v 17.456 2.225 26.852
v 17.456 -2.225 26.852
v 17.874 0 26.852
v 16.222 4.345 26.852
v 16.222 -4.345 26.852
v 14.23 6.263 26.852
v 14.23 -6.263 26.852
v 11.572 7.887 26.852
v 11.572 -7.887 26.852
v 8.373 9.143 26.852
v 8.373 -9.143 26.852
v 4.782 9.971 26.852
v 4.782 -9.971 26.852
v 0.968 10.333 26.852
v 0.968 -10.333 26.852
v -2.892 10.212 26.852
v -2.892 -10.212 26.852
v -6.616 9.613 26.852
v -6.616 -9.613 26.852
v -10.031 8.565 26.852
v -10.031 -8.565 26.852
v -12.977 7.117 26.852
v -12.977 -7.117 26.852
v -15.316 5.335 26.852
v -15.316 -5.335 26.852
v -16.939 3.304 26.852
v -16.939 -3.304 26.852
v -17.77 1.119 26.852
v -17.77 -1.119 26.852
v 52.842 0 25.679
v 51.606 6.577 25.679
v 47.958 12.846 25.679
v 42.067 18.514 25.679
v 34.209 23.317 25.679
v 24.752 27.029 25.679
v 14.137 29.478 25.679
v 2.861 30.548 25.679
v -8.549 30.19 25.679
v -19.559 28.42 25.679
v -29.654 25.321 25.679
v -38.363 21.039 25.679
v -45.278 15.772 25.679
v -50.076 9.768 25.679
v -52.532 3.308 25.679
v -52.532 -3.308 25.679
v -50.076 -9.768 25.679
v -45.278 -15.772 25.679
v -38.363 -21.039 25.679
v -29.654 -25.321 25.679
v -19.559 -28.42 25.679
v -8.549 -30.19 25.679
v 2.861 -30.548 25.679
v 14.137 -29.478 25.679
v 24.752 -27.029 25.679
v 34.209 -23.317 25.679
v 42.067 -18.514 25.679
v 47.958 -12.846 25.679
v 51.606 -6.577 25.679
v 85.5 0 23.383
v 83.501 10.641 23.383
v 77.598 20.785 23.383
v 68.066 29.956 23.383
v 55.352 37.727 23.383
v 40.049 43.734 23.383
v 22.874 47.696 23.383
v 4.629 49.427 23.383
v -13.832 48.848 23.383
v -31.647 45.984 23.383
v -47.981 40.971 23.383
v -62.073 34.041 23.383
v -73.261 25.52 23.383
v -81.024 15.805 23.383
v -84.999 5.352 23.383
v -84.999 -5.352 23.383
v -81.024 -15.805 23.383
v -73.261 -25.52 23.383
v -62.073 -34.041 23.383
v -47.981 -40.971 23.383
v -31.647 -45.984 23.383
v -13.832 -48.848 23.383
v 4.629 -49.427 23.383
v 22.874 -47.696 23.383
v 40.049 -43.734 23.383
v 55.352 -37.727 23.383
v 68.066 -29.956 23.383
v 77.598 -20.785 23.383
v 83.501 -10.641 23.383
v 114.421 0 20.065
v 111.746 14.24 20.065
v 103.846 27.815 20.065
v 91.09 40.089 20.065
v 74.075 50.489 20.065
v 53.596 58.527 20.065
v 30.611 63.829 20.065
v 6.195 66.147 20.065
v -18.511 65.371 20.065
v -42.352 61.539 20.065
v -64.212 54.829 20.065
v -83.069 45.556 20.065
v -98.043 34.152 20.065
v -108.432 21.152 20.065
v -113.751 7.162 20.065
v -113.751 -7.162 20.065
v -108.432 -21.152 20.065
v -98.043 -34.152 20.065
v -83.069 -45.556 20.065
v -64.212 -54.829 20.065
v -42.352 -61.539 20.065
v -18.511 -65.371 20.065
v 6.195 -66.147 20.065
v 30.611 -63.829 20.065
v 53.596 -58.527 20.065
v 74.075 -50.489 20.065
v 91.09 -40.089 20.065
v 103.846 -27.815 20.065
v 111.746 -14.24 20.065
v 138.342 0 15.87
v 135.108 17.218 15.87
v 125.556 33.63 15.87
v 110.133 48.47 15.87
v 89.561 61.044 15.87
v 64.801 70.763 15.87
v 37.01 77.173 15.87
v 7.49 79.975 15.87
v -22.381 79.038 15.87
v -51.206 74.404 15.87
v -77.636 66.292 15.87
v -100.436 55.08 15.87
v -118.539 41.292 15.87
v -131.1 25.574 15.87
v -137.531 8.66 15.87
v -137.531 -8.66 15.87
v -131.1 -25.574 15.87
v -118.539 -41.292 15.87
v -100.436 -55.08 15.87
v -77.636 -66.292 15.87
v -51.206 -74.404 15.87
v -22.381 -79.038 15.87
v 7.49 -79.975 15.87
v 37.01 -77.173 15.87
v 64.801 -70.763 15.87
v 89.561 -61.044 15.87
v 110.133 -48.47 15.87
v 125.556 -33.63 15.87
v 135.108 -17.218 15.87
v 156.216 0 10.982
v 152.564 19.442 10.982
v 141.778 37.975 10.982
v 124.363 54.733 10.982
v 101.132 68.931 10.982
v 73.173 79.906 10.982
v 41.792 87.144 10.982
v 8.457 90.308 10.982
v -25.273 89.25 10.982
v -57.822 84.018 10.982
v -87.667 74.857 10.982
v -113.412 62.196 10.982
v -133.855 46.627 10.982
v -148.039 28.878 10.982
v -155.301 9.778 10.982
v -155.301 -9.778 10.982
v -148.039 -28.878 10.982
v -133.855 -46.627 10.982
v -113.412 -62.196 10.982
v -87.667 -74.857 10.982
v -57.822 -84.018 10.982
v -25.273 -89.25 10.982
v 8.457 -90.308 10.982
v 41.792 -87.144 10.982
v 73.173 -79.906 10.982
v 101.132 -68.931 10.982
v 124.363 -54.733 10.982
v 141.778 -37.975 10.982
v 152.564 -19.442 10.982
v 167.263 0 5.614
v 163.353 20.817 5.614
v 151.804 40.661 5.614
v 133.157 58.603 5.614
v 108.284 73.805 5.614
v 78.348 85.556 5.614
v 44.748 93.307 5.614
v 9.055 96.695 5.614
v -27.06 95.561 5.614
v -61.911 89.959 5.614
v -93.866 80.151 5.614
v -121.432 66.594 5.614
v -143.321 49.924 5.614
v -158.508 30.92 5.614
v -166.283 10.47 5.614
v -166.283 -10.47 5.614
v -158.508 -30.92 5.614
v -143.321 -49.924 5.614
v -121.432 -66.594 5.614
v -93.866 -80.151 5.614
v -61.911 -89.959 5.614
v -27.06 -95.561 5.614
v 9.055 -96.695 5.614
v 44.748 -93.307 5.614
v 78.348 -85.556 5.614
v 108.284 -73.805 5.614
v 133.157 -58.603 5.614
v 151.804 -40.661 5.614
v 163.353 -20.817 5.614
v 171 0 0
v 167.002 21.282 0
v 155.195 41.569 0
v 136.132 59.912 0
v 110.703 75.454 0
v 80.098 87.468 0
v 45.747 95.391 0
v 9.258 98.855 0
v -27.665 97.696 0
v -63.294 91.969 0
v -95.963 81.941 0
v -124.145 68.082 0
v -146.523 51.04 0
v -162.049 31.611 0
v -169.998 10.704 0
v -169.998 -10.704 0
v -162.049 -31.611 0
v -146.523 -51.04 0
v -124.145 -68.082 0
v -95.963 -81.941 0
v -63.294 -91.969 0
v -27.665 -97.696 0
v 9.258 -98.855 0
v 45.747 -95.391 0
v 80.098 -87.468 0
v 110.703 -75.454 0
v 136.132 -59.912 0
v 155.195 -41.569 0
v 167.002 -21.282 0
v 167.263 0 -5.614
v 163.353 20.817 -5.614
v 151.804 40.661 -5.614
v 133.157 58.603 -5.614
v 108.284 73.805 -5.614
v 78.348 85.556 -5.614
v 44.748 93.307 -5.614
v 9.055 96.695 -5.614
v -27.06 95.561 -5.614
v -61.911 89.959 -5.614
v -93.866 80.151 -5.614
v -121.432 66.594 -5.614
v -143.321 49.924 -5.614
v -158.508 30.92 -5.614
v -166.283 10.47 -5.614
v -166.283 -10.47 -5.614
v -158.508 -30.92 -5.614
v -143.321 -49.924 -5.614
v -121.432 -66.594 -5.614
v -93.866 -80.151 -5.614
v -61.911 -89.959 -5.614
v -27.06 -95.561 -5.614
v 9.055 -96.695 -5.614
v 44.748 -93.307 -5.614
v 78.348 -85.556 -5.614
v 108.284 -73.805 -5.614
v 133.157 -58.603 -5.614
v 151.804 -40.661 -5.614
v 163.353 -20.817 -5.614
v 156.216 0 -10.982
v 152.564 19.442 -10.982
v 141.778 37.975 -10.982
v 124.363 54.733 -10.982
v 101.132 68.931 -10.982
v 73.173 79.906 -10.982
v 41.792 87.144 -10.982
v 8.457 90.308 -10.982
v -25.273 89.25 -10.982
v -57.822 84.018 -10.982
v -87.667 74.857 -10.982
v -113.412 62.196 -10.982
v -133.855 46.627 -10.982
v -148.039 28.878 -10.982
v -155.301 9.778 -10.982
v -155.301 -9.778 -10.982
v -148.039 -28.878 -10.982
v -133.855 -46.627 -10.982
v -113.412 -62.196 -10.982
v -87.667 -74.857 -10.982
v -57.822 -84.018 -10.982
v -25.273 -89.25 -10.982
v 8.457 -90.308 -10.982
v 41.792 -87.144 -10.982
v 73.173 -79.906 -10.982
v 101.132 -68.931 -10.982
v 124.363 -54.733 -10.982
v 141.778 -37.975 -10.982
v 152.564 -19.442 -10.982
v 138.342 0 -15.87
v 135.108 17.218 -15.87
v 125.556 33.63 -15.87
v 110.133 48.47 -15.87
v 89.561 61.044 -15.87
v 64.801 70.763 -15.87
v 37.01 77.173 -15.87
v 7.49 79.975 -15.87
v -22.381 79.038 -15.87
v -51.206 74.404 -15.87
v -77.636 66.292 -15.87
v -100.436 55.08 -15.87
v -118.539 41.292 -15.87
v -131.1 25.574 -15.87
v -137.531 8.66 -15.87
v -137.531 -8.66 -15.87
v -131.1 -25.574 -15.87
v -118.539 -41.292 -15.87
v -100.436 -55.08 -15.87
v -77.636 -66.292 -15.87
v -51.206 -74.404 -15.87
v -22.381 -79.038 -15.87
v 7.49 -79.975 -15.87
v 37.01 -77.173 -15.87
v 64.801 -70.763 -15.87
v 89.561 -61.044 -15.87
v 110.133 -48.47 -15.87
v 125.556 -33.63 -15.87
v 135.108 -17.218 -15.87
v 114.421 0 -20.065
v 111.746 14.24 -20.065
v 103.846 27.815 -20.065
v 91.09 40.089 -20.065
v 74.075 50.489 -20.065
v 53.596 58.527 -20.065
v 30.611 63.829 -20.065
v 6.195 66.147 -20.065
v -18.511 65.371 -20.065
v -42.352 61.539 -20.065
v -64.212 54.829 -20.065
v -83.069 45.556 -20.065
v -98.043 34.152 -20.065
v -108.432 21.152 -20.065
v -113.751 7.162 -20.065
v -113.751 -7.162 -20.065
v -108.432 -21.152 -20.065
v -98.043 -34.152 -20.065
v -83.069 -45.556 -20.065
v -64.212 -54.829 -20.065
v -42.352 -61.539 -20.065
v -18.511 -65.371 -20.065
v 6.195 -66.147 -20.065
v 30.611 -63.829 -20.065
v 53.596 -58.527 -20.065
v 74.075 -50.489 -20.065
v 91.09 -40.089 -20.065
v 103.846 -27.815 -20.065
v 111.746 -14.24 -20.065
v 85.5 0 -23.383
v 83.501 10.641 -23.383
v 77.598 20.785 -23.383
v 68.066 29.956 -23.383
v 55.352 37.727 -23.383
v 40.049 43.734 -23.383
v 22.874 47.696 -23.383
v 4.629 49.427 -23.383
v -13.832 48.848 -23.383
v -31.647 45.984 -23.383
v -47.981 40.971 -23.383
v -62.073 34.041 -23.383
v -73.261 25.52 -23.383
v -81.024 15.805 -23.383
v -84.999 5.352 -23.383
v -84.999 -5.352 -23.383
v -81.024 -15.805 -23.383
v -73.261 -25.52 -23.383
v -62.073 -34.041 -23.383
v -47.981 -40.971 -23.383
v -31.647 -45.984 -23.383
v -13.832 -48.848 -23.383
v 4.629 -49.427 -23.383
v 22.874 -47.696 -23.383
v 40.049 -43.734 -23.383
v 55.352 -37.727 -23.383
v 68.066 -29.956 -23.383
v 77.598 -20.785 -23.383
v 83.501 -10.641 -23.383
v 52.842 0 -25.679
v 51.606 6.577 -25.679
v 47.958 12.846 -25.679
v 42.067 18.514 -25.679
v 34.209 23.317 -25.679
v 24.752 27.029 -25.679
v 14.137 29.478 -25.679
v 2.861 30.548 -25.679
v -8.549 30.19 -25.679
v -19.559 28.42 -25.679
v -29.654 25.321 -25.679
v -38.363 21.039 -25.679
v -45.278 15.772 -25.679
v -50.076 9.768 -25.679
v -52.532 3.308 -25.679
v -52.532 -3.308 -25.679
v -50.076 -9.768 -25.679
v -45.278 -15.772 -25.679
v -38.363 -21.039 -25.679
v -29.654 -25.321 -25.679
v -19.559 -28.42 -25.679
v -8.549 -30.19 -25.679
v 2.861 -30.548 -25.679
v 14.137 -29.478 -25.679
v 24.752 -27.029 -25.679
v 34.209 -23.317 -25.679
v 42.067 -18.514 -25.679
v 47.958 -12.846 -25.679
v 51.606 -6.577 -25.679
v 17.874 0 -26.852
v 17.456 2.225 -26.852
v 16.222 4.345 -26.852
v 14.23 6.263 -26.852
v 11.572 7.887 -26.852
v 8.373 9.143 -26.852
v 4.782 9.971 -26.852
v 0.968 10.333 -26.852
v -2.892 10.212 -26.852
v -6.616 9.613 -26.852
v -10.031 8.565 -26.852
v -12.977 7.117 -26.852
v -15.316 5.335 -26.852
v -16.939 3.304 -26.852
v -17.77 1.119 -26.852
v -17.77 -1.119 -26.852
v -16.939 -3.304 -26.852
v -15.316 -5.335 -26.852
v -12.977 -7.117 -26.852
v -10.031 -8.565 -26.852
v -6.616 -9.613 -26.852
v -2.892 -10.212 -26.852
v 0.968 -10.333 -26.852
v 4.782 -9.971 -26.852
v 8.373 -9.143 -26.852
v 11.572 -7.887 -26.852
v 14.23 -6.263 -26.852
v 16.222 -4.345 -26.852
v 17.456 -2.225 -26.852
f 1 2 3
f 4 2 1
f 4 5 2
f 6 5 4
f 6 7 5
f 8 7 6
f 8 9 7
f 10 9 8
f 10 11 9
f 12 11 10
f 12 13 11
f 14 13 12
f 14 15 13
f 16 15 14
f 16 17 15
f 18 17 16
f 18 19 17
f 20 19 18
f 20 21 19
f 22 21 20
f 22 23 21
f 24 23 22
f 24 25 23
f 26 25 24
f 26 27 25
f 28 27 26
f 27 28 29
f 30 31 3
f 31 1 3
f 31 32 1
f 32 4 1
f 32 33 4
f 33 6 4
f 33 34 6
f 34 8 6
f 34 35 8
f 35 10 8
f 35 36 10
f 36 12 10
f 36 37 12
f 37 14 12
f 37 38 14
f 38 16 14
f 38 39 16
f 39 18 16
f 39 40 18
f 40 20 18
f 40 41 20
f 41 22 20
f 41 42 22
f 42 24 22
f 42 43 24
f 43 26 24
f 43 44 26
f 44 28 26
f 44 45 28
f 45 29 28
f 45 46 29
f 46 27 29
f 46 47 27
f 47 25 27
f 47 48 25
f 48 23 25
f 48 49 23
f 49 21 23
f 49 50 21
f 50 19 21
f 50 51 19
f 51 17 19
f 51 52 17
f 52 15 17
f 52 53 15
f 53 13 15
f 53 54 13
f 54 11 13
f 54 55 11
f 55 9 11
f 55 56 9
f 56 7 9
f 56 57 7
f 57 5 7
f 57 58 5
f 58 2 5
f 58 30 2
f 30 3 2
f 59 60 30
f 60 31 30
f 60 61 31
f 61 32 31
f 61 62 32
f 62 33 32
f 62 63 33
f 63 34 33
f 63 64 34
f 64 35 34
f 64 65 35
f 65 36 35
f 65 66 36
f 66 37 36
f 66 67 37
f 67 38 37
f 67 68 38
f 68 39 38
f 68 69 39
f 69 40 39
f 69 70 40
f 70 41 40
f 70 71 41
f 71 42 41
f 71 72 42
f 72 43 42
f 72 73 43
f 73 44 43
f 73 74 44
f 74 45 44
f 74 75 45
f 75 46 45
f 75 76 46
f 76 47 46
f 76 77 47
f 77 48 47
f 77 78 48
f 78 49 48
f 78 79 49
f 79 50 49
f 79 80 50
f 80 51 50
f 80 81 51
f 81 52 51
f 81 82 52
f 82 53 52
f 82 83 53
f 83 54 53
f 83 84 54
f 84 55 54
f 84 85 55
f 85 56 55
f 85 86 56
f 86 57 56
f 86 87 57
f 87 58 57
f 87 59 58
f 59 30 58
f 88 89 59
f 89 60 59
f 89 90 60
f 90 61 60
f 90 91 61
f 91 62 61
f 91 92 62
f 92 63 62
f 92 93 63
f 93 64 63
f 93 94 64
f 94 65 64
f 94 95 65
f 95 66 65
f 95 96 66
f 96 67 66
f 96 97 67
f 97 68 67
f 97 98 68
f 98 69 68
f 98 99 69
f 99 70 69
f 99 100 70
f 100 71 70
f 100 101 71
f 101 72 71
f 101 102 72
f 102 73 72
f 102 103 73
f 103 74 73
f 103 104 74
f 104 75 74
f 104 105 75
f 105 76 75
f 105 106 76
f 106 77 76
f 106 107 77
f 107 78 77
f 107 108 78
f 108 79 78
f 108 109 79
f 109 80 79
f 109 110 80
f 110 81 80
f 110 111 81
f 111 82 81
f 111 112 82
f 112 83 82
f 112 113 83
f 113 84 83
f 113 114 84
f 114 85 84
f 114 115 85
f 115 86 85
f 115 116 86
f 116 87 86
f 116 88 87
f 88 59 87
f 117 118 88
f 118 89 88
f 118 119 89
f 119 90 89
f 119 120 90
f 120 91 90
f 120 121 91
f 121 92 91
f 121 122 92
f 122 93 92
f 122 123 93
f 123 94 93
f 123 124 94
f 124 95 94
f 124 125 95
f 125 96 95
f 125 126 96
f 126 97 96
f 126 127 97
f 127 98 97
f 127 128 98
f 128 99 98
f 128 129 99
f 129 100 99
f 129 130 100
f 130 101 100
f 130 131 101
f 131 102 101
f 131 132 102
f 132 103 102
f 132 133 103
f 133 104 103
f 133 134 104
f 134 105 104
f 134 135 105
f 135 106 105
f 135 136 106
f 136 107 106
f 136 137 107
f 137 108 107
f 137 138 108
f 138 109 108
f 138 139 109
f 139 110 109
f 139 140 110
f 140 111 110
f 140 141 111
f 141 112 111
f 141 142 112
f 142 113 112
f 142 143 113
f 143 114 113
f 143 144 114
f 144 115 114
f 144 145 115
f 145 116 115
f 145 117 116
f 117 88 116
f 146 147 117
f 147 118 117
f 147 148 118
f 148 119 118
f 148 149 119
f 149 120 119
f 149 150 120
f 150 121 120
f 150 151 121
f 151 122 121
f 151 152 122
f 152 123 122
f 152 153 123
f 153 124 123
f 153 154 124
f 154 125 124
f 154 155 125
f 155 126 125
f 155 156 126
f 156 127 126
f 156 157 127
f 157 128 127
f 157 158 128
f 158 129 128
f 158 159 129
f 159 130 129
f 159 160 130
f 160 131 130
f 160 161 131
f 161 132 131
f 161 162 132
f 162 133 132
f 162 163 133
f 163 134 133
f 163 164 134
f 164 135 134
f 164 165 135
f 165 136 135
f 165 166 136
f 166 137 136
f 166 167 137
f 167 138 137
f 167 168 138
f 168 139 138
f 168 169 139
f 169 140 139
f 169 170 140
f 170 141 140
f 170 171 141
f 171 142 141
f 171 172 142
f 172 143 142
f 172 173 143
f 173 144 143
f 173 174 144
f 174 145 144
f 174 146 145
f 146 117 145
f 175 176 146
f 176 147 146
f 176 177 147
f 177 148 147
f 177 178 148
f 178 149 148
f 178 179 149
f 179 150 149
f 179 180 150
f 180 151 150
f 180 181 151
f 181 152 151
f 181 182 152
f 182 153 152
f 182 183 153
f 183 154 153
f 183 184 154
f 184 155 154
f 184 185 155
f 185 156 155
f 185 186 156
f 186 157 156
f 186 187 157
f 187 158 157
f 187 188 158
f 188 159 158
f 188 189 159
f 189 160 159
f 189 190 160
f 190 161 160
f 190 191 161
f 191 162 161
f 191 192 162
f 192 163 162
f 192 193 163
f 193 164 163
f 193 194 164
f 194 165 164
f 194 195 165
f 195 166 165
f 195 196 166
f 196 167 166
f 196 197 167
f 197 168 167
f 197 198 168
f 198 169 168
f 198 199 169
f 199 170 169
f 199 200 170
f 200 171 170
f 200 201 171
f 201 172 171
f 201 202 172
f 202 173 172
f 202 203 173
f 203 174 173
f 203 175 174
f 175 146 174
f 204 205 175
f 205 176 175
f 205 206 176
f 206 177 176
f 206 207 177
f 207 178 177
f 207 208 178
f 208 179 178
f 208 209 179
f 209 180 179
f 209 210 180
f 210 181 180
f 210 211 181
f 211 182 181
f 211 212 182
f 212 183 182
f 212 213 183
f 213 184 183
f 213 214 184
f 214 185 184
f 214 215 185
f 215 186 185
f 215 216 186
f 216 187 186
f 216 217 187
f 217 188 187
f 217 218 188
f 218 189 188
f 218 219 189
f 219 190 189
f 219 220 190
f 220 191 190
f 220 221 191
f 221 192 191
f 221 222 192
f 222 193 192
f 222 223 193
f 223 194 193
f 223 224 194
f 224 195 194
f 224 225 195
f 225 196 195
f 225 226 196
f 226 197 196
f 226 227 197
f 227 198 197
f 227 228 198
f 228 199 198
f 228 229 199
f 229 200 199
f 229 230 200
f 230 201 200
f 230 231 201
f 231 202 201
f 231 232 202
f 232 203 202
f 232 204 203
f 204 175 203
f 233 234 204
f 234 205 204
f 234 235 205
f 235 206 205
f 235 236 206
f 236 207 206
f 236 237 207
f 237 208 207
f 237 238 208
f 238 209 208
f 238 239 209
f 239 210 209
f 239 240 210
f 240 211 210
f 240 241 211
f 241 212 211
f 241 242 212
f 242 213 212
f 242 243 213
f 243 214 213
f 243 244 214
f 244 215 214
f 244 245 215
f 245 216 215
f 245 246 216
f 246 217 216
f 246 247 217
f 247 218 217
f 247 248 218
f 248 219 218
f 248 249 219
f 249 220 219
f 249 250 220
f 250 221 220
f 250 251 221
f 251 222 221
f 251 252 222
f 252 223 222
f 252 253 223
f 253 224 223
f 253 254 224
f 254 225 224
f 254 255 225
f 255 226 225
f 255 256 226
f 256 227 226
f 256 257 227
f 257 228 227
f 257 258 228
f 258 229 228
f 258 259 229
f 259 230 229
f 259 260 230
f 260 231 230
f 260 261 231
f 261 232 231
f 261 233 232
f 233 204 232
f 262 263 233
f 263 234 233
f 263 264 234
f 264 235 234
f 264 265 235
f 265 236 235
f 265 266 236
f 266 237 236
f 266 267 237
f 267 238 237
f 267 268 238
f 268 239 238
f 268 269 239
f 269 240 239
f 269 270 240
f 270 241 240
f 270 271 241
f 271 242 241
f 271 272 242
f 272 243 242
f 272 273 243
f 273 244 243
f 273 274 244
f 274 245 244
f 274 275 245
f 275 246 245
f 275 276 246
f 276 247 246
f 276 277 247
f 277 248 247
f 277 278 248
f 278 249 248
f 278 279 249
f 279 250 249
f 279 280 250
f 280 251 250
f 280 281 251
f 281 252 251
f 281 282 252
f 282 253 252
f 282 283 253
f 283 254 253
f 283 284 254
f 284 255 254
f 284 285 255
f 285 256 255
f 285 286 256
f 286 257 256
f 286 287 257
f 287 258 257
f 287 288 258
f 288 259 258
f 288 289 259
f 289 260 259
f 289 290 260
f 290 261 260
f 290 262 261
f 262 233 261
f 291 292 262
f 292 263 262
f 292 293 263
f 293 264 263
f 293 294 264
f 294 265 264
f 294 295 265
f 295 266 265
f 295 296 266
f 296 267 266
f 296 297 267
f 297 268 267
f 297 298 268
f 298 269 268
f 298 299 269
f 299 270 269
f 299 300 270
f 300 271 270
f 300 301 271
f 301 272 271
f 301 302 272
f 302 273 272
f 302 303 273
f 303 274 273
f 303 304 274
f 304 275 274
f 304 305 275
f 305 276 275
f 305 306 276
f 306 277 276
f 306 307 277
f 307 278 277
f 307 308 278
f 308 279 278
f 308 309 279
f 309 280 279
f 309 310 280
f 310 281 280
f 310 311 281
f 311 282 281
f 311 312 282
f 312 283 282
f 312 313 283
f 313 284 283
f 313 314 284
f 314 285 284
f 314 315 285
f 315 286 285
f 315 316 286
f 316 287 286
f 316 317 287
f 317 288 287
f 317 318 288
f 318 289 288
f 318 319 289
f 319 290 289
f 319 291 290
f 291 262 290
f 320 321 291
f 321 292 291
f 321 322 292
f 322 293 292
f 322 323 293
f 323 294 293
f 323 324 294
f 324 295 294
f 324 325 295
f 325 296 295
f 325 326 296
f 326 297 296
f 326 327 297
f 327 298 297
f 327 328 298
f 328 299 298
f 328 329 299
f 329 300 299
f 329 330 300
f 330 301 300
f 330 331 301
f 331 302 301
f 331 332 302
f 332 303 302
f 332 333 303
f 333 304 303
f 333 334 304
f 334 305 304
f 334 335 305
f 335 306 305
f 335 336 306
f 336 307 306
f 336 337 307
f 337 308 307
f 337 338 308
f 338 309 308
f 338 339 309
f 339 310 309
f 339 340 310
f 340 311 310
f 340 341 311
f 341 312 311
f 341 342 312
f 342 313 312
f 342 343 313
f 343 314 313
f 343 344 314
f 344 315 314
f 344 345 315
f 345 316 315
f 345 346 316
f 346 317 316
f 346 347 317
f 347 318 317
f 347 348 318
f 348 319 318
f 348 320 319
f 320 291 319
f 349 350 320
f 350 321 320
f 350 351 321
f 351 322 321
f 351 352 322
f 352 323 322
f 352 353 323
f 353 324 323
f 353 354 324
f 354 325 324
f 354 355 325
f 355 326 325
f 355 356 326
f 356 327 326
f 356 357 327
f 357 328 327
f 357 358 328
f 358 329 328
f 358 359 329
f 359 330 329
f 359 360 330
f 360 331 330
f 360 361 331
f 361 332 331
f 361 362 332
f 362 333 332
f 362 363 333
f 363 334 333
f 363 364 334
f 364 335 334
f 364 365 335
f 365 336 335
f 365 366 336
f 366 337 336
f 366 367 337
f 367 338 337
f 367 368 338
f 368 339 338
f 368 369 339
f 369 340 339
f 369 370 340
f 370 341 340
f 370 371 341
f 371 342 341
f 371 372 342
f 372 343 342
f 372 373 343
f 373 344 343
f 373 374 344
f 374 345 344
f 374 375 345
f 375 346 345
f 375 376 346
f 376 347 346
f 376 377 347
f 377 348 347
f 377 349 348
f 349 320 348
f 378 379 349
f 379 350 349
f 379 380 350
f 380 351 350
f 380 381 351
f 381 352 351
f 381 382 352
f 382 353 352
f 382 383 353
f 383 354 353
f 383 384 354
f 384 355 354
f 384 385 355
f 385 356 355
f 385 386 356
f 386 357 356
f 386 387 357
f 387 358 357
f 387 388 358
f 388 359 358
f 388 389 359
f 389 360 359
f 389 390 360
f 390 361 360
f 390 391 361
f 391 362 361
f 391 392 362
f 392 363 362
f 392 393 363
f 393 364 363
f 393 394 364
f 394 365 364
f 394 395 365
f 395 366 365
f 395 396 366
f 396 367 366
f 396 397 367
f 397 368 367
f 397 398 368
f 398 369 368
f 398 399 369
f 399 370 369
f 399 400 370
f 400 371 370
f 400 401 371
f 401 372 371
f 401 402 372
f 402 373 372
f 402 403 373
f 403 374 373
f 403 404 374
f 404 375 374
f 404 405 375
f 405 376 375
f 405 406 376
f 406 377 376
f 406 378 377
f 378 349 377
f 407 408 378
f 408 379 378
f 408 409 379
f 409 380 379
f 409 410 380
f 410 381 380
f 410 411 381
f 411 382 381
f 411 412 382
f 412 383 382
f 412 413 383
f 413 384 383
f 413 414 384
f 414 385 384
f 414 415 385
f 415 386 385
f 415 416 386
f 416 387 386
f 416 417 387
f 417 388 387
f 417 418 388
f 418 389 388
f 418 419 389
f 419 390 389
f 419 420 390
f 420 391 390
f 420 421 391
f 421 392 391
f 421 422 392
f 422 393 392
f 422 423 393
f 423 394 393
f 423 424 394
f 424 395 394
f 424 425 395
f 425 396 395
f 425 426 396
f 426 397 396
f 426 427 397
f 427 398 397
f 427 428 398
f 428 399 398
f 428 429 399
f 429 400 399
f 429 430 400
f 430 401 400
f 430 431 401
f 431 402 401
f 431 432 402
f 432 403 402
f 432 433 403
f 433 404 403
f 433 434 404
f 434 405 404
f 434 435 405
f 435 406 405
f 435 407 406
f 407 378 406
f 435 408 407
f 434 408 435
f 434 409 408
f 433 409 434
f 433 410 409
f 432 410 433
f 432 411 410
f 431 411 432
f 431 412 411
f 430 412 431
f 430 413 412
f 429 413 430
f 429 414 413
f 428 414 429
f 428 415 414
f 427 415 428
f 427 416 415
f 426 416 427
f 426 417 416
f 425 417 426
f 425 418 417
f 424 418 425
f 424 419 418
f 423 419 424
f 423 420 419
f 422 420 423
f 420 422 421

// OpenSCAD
// Generated by SolidPython 1.0.1 on 2020-07-29 00:46:54


scale(v = [19, 11, 3]) {
	sphere(r = 9);
}
/***********************************************
*********      SolidPython code:      **********
************************************************
 
# import packages: SolidPython
from solid import *
from solid.utils import *
from itertools import chain, combinations, permutations


class Resize:

    def __init__(self, scad_file):
        self.scad_file = scad_file
        #self.scad_file = import_scad(scad_file)
        # cone/cylinder param:
        self.r1 = 0
        self.r2 = 0
        self.h = 0
        # rectangular prism param:
        self.w = 0
        self.l = 0
        # ellipse param:
        self.r = 0

    # import OpenScad code (file name corresponds to shape)


    # classify shape + parameters
    def assign(self, param1, param2, param3):
        if self.scad_file == 'cone.scad':
            self.r1 = param1
            self.r2 = param2
            self.h = param3
        elif self.scad_file == 'cylinder.scad':
            self.r1 = param1
            self.r2 = param2
            self.h = param3
        elif self.scad_file == 'rectangularPrism.scad':
            self.h = param1
            self.l = param2
            self.w = param3
        else:
            self.r = param1
            self.h = param2

    # resize parameters
    def iterate(self):
        x = range(3, 20, 2)
        i = 1
        if self.scad_file == 'cone.scad':
            tempList = list(permutations(x, 2))
            for temp in tempList:
                param1 = temp[0]
                param2 = temp[1]
                filepath = 'produced_scad_files/' + 'cone' + str(param1) + '_' + str(param2) + '_' + '.scad'
                scad_render_to_file(cylinder(h=param1, r1=param2, r2=0), filepath)

        elif self.scad_file == 'cylinder.scad':
            tempList = list(permutations(x, 3))
            for temp in tempList:
                param1 = temp[0]
                param2 = temp[1]
                filepath = 'produced_scad_files/' + 'cylinder' + str(param1) + '_' + str(param2) + '_' + '.scad'
                scad_render_to_file(cylinder(h=param1, r1=param2, r2=param2), filepath)

        elif self.scad_file == 'rectangularPrism.scad':
            tempList = list(permutations(x, 3))
            for temp in tempList:
                param1 = temp[0]
                param2 = temp[1]
                param3 = temp[2]
                filepath = 'produced_scad_files/' + 'rectangularPrism' + str(param1) + '_' + str(param2) + '_' + str(
                    param3) + '.scad'
                scad_render_to_file(cube(size=(param1, param2, param3)), filepath)

        elif self.scad_file == 'ellipse.scad':
            tempList = list(permutations(x, 4))
            for temp in tempList:
                param1 = temp[0]
                param2 = temp[1]
                param3 = temp[2]
                param4 = temp[3]
                filepath = 'produced_scad_files/' + 'ellipse' + str(param1) + '_' + str(param2) + '_' + str(param3) + '_' + str(param4) + '.scad'
                scad_render_to_file(scale([param1, param2, param3])(sphere(r=param4)), filepath)

    def render_to_scadfile(self):
        scad_render_to_file(scad, 'example.scad') 
 
************************************************/
